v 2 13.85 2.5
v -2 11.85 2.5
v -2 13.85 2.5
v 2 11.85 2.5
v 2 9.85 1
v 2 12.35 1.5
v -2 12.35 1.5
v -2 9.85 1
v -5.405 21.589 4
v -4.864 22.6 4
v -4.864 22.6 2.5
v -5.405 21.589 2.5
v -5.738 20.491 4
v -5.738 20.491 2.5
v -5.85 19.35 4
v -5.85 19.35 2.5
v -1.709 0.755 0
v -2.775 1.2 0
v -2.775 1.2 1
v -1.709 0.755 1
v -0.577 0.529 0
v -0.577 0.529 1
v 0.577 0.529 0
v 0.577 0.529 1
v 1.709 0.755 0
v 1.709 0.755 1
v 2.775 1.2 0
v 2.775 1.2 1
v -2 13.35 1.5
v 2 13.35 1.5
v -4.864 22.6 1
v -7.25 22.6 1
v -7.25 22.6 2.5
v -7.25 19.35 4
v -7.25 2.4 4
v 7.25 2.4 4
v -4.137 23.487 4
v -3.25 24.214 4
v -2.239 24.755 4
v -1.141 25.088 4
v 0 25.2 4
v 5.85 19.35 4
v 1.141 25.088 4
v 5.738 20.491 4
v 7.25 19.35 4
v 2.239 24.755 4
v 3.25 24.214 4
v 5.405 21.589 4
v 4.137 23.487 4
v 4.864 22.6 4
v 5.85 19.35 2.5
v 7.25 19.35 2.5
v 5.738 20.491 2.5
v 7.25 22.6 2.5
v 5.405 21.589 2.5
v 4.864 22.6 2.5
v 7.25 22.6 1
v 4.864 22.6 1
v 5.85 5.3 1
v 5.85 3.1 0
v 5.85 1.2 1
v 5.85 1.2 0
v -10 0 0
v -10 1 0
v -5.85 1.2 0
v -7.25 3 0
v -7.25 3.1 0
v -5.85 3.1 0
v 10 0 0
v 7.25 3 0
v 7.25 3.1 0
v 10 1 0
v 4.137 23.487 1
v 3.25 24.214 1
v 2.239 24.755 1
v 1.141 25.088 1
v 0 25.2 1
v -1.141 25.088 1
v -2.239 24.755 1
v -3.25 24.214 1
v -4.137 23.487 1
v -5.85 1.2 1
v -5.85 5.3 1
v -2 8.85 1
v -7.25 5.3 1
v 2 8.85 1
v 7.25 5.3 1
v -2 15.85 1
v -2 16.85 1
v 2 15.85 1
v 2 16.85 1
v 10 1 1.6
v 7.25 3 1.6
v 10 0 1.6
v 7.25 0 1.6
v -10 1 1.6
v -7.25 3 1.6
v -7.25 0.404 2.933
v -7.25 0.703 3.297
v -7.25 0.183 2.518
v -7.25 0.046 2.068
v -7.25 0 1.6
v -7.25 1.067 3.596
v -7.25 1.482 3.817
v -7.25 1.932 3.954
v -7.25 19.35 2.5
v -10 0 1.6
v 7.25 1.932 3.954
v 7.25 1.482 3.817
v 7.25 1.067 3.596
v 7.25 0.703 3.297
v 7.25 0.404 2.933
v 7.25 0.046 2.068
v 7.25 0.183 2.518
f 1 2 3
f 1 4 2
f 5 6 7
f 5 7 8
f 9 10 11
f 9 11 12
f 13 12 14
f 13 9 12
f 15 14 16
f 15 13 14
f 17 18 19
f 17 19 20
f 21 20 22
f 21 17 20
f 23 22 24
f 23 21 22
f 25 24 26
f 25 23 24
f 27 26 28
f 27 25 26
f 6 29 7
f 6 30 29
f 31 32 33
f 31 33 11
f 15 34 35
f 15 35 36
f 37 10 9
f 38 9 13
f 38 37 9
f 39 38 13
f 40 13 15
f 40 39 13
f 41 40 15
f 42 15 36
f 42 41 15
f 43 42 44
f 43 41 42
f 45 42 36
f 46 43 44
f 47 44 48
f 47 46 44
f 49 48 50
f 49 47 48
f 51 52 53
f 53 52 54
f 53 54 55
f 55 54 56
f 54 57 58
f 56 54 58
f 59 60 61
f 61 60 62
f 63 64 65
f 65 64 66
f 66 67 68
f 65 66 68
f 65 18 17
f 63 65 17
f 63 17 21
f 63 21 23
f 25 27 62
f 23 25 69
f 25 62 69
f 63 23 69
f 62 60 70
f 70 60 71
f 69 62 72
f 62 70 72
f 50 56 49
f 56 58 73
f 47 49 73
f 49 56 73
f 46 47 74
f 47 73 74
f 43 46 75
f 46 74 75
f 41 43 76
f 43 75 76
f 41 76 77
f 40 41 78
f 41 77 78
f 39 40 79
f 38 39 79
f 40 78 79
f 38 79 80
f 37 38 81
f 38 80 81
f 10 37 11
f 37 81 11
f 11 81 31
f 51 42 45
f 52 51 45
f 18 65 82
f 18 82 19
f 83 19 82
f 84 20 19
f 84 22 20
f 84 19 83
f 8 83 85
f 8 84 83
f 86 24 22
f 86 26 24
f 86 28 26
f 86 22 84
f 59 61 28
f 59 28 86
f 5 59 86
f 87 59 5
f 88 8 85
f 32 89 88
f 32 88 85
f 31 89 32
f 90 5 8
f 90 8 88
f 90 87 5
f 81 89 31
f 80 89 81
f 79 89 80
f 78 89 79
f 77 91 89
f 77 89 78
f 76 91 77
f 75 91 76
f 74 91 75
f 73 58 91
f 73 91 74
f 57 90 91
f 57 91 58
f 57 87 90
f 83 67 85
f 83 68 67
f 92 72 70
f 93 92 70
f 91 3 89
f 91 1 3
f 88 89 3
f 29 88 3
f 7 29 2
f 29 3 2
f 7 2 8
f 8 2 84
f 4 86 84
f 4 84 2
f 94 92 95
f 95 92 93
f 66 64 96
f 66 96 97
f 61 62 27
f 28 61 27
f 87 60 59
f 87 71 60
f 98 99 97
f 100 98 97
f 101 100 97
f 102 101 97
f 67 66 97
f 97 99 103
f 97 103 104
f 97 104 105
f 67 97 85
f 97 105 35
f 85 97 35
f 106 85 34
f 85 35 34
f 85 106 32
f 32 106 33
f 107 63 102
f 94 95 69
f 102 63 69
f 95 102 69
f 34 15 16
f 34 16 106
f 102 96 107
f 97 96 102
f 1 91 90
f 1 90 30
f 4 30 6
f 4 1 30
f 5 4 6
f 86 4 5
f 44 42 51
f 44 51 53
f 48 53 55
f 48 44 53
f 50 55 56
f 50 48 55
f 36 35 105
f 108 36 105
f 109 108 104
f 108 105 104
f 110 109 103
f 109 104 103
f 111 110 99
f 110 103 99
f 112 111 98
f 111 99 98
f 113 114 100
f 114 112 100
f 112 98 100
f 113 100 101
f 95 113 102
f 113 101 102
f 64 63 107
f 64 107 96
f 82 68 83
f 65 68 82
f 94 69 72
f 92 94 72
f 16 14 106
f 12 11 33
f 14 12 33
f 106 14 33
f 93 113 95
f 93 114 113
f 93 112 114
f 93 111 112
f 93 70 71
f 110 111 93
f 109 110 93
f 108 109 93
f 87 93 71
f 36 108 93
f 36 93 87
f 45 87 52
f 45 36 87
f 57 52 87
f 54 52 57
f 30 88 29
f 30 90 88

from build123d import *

# Parameters (mm, degrees)
PAD_DEPTH            = 4
POCKET_DEPTH         = 1.5
POCKET004_DEPTH      = 2.4
POCKET005_DEPTH      = 10.001
POCKET005_DEPTH_BACK = -10.001
POCKET006_DEPTH      = 10.001
POCKET006_DEPTH_BACK = -10.001
POCKET007_DEPTH      = 1
POCKET008_DEPTH      = 2


with BuildPart() as part:
    # Sketch → Pad (new body)
    with BuildSketch(Plane.XY):
        with BuildLine():
            Line((-10, 0), (10, 0))
            Line((10, 0), (10, 1))
            Line((10, 1), (7.25, 3))
            Line((7.25, 3), (7.25, 22.6))
            Line((7.25, 22.6), (4.864155, 22.6))
            ThreePointArc((4.864155, 22.6), (0, 25.2), (-4.864155, 22.6))
            Line((-7.25, 22.6), (-4.864155, 22.6))
            Line((-7.25, 3), (-7.25, 22.6))
            Line((-10, 1), (-7.25, 3))
            Line((-10, 0), (-10, 1))
        make_face()
    extrude(amount=PAD_DEPTH)

    # Sketch001 (on Face12 of Pad) → Pocket (cut)
    with BuildSketch(Plane.XY.offset(4)):
        with BuildLine():
            ThreePointArc((-4.864155, 22.6), (-5.598116, 21.048116), (-5.85, 19.35))
            Line((-5.85, 19.35), (-7.25, 19.35))
            Line((-7.25, 19.35), (-7.25, 22.6))
            Line((-4.864155, 22.6), (-7.25, 22.6))
        make_face()
        with BuildLine():
            ThreePointArc((5.85, 19.35), (5.598116, 21.048116), (4.864155, 22.6))
            Line((7.25, 22.6), (4.864155, 22.6))
            Line((7.25, 19.35), (7.25, 22.6))
            Line((5.85, 19.35), (7.25, 19.35))
        make_face()
    extrude(amount=-POCKET_DEPTH, mode=Mode.SUBTRACT)

    # Sketch005 (on Face12 of Pad) → Pocket004 (cut)
    with BuildSketch(Plane.XY.offset(4)):
        Polygon((-7.25, 3), (-10, 1), (-10, 0), (-7.25, 0), align=None)
        Polygon((7.25, 3), (10, 1), (10, 0), (7.25, 0), align=None)
    extrude(amount=-POCKET004_DEPTH, mode=Mode.SUBTRACT)

    # Sketch006 → Pocket005 (cut, two sides)
    with BuildSketch(Plane.YZ) as pocket005_sk:
        with BuildLine():
            ThreePointArc((2.4, 4), (0.702944, 3.297056), (0, 1.6))
            Line((0, 1.6), (0, 4))
            Line((2.4, 4), (0, 4))
        make_face()
    extrude(amount=-POCKET005_DEPTH, mode=Mode.SUBTRACT)
    extrude(pocket005_sk.sketch, amount=-POCKET005_DEPTH_BACK, mode=Mode.SUBTRACT)

    # Sketch007 → Pocket006 (cut, two sides)
    with BuildSketch(Plane.YZ) as pocket006_sk:
        Polygon((3.1, 0), (5.3, 1), (25.2, 1), (25.2, 0), align=None)
    extrude(amount=-POCKET006_DEPTH, mode=Mode.SUBTRACT)
    extrude(pocket006_sk.sketch, amount=-POCKET006_DEPTH_BACK, mode=Mode.SUBTRACT)

    # Sketch008 → Pocket007 (cut)
    with BuildSketch(Plane.XY):
        with BuildLine():
            Line((-5.85, 5.3), (-5.85, 1.2))
            Line((-5.85, 1.2), (-2.774887, 1.2))
            ThreePointArc((-2.774887, 1.2), (0, 0.5), (2.774887, 1.2))
            Line((5.85, 1.2), (2.774887, 1.2))
            Line((5.85, 5.3), (5.85, 1.2))
            Line((-5.85, 5.3), (5.85, 5.3))
        make_face()
    extrude(amount=POCKET007_DEPTH, mode=Mode.SUBTRACT)

    # Sketch009 → Pocket008 (cut, symmetric)
    with BuildSketch(Plane.YZ):
        Polygon((8.85, 1), (11.85, 2.5), (13.85, 2.5), (16.85, 1), (15.85, 1), (13.35, 1.5), (12.35, 1.5), (9.85, 1), align=None)
    extrude(amount=POCKET008_DEPTH, both=True, mode=Mode.SUBTRACT)


solid = part.part
